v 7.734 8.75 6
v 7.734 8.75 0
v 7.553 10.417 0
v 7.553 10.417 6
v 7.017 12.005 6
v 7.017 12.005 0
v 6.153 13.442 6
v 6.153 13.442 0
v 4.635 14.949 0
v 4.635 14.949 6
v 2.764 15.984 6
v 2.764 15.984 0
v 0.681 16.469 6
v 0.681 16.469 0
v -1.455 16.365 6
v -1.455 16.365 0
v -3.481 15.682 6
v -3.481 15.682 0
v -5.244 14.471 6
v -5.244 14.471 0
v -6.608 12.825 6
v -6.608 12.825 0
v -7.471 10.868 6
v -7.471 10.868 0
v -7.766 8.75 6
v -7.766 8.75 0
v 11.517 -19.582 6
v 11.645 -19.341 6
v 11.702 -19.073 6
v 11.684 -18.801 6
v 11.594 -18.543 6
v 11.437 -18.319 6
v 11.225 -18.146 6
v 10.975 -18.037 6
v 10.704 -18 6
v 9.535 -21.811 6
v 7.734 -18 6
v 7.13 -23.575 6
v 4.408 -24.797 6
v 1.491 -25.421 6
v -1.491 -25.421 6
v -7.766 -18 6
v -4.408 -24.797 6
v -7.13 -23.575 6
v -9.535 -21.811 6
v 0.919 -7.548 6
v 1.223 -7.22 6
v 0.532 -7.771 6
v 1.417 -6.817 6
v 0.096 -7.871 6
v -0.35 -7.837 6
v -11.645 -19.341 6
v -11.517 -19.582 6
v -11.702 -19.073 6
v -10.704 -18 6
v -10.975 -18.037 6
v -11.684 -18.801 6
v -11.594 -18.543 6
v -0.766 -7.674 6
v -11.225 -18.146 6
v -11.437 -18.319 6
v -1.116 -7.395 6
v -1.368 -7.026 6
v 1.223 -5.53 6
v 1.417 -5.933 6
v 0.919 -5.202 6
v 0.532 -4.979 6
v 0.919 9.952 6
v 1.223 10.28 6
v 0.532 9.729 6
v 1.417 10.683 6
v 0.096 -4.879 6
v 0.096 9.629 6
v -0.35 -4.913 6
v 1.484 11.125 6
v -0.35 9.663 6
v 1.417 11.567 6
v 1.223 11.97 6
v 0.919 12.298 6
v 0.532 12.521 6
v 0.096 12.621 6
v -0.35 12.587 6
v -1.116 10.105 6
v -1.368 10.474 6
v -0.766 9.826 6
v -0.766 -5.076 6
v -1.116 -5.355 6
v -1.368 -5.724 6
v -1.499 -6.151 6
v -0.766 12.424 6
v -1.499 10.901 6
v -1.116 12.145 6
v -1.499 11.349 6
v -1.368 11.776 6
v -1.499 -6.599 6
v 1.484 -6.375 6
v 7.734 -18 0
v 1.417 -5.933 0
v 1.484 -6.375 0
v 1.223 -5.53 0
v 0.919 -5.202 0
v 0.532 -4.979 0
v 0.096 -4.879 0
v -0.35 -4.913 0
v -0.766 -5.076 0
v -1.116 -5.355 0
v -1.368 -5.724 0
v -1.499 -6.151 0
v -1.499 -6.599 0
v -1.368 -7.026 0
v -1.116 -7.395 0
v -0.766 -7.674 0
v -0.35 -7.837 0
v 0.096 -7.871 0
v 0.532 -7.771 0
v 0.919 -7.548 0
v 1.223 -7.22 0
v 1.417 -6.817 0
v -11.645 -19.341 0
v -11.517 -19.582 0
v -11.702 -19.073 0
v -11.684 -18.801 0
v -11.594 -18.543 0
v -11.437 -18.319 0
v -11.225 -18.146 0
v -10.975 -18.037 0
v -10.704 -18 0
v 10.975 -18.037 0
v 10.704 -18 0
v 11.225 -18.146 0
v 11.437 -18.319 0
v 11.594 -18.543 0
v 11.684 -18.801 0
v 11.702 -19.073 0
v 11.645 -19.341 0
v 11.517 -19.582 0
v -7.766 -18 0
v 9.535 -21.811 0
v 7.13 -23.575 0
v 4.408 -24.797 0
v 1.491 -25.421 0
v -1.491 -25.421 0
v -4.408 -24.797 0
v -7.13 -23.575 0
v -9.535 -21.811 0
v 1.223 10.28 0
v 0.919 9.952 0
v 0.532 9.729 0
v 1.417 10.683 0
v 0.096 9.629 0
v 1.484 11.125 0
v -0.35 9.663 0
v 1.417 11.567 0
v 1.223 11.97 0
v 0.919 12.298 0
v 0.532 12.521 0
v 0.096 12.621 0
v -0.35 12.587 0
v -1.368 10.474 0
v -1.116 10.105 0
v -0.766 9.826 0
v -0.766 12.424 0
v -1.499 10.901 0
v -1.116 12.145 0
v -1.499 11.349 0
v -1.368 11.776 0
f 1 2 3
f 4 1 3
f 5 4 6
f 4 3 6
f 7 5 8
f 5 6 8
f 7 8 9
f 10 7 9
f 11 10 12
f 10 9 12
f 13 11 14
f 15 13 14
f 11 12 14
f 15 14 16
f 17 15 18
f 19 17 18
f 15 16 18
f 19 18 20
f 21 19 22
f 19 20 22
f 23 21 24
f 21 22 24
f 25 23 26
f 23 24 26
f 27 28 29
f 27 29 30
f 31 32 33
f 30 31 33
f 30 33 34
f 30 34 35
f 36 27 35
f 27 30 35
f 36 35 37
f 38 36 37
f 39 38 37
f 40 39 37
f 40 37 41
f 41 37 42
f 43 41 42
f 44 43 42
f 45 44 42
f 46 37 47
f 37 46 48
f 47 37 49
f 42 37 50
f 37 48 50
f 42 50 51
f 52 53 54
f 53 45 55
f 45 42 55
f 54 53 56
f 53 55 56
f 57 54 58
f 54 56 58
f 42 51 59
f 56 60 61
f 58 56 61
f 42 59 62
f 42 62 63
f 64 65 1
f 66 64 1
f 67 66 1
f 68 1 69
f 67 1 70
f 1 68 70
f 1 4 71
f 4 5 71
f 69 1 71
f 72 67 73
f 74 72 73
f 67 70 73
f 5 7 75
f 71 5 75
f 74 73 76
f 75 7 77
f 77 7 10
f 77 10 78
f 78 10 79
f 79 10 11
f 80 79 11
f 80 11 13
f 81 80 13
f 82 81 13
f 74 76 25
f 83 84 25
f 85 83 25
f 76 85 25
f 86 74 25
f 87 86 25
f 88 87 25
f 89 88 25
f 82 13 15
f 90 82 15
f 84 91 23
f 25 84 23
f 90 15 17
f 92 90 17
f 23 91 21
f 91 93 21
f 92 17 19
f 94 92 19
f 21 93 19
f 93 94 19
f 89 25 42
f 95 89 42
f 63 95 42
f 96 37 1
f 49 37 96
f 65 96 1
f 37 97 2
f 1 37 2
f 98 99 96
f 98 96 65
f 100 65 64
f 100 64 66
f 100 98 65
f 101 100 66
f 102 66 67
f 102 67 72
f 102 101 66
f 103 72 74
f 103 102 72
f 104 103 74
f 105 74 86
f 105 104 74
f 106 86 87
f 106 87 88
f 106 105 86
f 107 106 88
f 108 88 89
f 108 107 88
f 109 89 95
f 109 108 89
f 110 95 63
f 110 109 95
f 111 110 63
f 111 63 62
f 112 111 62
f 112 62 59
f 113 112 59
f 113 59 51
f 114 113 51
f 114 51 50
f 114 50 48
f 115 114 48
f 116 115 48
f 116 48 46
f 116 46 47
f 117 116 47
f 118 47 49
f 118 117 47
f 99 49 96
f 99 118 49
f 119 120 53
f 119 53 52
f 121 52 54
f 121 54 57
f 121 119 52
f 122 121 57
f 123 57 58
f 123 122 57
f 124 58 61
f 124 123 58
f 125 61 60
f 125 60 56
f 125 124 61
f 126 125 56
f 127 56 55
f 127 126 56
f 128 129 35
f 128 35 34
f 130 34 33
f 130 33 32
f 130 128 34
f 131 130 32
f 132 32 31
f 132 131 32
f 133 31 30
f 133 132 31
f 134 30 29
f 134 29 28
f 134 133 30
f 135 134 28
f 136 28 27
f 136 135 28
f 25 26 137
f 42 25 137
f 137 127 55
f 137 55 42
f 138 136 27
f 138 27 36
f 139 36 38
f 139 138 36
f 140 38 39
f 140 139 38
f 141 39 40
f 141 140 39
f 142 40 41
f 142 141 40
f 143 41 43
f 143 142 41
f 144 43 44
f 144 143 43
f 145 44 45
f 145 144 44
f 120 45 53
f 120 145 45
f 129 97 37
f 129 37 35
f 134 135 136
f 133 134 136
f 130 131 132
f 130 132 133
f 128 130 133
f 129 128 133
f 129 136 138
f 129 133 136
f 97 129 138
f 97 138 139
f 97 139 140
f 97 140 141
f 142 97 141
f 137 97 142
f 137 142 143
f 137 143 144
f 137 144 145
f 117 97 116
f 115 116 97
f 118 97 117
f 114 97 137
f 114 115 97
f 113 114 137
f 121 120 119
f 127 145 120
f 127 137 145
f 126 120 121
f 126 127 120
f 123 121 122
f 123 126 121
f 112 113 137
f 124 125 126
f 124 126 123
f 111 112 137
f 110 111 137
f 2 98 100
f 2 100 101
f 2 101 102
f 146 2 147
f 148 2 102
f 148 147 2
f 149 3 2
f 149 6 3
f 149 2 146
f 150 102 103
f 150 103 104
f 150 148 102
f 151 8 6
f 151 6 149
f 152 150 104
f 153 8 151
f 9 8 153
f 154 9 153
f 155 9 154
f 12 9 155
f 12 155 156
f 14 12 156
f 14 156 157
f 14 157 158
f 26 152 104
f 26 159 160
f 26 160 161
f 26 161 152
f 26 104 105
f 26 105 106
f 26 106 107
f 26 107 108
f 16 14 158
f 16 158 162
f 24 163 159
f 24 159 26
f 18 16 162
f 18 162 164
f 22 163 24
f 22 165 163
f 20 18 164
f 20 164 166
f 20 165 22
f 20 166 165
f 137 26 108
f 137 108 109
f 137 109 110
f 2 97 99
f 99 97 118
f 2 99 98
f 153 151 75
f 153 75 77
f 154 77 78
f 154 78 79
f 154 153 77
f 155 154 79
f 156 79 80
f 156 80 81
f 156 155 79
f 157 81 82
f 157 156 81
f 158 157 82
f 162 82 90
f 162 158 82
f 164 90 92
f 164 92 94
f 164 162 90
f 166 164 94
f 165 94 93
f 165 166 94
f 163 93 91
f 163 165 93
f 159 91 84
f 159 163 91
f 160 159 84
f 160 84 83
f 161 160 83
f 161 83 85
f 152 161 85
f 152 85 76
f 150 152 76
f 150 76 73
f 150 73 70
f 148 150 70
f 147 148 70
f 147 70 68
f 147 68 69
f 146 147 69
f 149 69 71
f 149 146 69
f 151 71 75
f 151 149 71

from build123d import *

# Parameters (mm, degrees)
SKETCH1_R           = 1.5
BOSS_EXTRUDE2_DEPTH = 6


with BuildPart() as part:
    # Sketch1 → Boss-Extrude2 (new body)
    # profile 1 of 2: a face of its own
    with BuildSketch(Plane.XY):
        with BuildLine():
            Line((-7.766144764, 8.750016816), (-7.766144764, -18))
            Line((-7.766144764, -18), (7.733855236, -18))
            Line((7.733855236, -18), (7.733855236, 8.750016816))
            ThreePointArc((7.733855236, 8.750016816), (7.327886817, 11.225436), (6.152513266, 13.44151531))
            ThreePointArc((6.152513266, 13.44151531), (-2.491563947, 16.094048398), (-7.766144764, 8.750016816))
        make_face()
        with Locations((-0.016144764, -6.375)):
            Circle(SKETCH1_R, mode=Mode.SUBTRACT)
        with Locations((-0.016144764, 11.125)):
            Circle(SKETCH1_R, mode=Mode.SUBTRACT)
    # profile 2 of 2: a face of its own
    with BuildSketch(Plane.XY):
        with BuildLine():
            ThreePointArc((10.704360482, -18), (11.593820566, -18.542987134), (11.517349886, -19.582278481))
            ThreePointArc((11.517349886, -19.582278481), (0, -25.5), (-11.517349886, -19.582278481))
            ThreePointArc((-11.517349886, -19.582278481), (-11.593820566, -18.542987134), (-10.704360482, -18))
            Line((-10.704360482, -18), (10.704360482, -18))
        make_face()
    extrude(amount=BOSS_EXTRUDE2_DEPTH)


solid = part.part
